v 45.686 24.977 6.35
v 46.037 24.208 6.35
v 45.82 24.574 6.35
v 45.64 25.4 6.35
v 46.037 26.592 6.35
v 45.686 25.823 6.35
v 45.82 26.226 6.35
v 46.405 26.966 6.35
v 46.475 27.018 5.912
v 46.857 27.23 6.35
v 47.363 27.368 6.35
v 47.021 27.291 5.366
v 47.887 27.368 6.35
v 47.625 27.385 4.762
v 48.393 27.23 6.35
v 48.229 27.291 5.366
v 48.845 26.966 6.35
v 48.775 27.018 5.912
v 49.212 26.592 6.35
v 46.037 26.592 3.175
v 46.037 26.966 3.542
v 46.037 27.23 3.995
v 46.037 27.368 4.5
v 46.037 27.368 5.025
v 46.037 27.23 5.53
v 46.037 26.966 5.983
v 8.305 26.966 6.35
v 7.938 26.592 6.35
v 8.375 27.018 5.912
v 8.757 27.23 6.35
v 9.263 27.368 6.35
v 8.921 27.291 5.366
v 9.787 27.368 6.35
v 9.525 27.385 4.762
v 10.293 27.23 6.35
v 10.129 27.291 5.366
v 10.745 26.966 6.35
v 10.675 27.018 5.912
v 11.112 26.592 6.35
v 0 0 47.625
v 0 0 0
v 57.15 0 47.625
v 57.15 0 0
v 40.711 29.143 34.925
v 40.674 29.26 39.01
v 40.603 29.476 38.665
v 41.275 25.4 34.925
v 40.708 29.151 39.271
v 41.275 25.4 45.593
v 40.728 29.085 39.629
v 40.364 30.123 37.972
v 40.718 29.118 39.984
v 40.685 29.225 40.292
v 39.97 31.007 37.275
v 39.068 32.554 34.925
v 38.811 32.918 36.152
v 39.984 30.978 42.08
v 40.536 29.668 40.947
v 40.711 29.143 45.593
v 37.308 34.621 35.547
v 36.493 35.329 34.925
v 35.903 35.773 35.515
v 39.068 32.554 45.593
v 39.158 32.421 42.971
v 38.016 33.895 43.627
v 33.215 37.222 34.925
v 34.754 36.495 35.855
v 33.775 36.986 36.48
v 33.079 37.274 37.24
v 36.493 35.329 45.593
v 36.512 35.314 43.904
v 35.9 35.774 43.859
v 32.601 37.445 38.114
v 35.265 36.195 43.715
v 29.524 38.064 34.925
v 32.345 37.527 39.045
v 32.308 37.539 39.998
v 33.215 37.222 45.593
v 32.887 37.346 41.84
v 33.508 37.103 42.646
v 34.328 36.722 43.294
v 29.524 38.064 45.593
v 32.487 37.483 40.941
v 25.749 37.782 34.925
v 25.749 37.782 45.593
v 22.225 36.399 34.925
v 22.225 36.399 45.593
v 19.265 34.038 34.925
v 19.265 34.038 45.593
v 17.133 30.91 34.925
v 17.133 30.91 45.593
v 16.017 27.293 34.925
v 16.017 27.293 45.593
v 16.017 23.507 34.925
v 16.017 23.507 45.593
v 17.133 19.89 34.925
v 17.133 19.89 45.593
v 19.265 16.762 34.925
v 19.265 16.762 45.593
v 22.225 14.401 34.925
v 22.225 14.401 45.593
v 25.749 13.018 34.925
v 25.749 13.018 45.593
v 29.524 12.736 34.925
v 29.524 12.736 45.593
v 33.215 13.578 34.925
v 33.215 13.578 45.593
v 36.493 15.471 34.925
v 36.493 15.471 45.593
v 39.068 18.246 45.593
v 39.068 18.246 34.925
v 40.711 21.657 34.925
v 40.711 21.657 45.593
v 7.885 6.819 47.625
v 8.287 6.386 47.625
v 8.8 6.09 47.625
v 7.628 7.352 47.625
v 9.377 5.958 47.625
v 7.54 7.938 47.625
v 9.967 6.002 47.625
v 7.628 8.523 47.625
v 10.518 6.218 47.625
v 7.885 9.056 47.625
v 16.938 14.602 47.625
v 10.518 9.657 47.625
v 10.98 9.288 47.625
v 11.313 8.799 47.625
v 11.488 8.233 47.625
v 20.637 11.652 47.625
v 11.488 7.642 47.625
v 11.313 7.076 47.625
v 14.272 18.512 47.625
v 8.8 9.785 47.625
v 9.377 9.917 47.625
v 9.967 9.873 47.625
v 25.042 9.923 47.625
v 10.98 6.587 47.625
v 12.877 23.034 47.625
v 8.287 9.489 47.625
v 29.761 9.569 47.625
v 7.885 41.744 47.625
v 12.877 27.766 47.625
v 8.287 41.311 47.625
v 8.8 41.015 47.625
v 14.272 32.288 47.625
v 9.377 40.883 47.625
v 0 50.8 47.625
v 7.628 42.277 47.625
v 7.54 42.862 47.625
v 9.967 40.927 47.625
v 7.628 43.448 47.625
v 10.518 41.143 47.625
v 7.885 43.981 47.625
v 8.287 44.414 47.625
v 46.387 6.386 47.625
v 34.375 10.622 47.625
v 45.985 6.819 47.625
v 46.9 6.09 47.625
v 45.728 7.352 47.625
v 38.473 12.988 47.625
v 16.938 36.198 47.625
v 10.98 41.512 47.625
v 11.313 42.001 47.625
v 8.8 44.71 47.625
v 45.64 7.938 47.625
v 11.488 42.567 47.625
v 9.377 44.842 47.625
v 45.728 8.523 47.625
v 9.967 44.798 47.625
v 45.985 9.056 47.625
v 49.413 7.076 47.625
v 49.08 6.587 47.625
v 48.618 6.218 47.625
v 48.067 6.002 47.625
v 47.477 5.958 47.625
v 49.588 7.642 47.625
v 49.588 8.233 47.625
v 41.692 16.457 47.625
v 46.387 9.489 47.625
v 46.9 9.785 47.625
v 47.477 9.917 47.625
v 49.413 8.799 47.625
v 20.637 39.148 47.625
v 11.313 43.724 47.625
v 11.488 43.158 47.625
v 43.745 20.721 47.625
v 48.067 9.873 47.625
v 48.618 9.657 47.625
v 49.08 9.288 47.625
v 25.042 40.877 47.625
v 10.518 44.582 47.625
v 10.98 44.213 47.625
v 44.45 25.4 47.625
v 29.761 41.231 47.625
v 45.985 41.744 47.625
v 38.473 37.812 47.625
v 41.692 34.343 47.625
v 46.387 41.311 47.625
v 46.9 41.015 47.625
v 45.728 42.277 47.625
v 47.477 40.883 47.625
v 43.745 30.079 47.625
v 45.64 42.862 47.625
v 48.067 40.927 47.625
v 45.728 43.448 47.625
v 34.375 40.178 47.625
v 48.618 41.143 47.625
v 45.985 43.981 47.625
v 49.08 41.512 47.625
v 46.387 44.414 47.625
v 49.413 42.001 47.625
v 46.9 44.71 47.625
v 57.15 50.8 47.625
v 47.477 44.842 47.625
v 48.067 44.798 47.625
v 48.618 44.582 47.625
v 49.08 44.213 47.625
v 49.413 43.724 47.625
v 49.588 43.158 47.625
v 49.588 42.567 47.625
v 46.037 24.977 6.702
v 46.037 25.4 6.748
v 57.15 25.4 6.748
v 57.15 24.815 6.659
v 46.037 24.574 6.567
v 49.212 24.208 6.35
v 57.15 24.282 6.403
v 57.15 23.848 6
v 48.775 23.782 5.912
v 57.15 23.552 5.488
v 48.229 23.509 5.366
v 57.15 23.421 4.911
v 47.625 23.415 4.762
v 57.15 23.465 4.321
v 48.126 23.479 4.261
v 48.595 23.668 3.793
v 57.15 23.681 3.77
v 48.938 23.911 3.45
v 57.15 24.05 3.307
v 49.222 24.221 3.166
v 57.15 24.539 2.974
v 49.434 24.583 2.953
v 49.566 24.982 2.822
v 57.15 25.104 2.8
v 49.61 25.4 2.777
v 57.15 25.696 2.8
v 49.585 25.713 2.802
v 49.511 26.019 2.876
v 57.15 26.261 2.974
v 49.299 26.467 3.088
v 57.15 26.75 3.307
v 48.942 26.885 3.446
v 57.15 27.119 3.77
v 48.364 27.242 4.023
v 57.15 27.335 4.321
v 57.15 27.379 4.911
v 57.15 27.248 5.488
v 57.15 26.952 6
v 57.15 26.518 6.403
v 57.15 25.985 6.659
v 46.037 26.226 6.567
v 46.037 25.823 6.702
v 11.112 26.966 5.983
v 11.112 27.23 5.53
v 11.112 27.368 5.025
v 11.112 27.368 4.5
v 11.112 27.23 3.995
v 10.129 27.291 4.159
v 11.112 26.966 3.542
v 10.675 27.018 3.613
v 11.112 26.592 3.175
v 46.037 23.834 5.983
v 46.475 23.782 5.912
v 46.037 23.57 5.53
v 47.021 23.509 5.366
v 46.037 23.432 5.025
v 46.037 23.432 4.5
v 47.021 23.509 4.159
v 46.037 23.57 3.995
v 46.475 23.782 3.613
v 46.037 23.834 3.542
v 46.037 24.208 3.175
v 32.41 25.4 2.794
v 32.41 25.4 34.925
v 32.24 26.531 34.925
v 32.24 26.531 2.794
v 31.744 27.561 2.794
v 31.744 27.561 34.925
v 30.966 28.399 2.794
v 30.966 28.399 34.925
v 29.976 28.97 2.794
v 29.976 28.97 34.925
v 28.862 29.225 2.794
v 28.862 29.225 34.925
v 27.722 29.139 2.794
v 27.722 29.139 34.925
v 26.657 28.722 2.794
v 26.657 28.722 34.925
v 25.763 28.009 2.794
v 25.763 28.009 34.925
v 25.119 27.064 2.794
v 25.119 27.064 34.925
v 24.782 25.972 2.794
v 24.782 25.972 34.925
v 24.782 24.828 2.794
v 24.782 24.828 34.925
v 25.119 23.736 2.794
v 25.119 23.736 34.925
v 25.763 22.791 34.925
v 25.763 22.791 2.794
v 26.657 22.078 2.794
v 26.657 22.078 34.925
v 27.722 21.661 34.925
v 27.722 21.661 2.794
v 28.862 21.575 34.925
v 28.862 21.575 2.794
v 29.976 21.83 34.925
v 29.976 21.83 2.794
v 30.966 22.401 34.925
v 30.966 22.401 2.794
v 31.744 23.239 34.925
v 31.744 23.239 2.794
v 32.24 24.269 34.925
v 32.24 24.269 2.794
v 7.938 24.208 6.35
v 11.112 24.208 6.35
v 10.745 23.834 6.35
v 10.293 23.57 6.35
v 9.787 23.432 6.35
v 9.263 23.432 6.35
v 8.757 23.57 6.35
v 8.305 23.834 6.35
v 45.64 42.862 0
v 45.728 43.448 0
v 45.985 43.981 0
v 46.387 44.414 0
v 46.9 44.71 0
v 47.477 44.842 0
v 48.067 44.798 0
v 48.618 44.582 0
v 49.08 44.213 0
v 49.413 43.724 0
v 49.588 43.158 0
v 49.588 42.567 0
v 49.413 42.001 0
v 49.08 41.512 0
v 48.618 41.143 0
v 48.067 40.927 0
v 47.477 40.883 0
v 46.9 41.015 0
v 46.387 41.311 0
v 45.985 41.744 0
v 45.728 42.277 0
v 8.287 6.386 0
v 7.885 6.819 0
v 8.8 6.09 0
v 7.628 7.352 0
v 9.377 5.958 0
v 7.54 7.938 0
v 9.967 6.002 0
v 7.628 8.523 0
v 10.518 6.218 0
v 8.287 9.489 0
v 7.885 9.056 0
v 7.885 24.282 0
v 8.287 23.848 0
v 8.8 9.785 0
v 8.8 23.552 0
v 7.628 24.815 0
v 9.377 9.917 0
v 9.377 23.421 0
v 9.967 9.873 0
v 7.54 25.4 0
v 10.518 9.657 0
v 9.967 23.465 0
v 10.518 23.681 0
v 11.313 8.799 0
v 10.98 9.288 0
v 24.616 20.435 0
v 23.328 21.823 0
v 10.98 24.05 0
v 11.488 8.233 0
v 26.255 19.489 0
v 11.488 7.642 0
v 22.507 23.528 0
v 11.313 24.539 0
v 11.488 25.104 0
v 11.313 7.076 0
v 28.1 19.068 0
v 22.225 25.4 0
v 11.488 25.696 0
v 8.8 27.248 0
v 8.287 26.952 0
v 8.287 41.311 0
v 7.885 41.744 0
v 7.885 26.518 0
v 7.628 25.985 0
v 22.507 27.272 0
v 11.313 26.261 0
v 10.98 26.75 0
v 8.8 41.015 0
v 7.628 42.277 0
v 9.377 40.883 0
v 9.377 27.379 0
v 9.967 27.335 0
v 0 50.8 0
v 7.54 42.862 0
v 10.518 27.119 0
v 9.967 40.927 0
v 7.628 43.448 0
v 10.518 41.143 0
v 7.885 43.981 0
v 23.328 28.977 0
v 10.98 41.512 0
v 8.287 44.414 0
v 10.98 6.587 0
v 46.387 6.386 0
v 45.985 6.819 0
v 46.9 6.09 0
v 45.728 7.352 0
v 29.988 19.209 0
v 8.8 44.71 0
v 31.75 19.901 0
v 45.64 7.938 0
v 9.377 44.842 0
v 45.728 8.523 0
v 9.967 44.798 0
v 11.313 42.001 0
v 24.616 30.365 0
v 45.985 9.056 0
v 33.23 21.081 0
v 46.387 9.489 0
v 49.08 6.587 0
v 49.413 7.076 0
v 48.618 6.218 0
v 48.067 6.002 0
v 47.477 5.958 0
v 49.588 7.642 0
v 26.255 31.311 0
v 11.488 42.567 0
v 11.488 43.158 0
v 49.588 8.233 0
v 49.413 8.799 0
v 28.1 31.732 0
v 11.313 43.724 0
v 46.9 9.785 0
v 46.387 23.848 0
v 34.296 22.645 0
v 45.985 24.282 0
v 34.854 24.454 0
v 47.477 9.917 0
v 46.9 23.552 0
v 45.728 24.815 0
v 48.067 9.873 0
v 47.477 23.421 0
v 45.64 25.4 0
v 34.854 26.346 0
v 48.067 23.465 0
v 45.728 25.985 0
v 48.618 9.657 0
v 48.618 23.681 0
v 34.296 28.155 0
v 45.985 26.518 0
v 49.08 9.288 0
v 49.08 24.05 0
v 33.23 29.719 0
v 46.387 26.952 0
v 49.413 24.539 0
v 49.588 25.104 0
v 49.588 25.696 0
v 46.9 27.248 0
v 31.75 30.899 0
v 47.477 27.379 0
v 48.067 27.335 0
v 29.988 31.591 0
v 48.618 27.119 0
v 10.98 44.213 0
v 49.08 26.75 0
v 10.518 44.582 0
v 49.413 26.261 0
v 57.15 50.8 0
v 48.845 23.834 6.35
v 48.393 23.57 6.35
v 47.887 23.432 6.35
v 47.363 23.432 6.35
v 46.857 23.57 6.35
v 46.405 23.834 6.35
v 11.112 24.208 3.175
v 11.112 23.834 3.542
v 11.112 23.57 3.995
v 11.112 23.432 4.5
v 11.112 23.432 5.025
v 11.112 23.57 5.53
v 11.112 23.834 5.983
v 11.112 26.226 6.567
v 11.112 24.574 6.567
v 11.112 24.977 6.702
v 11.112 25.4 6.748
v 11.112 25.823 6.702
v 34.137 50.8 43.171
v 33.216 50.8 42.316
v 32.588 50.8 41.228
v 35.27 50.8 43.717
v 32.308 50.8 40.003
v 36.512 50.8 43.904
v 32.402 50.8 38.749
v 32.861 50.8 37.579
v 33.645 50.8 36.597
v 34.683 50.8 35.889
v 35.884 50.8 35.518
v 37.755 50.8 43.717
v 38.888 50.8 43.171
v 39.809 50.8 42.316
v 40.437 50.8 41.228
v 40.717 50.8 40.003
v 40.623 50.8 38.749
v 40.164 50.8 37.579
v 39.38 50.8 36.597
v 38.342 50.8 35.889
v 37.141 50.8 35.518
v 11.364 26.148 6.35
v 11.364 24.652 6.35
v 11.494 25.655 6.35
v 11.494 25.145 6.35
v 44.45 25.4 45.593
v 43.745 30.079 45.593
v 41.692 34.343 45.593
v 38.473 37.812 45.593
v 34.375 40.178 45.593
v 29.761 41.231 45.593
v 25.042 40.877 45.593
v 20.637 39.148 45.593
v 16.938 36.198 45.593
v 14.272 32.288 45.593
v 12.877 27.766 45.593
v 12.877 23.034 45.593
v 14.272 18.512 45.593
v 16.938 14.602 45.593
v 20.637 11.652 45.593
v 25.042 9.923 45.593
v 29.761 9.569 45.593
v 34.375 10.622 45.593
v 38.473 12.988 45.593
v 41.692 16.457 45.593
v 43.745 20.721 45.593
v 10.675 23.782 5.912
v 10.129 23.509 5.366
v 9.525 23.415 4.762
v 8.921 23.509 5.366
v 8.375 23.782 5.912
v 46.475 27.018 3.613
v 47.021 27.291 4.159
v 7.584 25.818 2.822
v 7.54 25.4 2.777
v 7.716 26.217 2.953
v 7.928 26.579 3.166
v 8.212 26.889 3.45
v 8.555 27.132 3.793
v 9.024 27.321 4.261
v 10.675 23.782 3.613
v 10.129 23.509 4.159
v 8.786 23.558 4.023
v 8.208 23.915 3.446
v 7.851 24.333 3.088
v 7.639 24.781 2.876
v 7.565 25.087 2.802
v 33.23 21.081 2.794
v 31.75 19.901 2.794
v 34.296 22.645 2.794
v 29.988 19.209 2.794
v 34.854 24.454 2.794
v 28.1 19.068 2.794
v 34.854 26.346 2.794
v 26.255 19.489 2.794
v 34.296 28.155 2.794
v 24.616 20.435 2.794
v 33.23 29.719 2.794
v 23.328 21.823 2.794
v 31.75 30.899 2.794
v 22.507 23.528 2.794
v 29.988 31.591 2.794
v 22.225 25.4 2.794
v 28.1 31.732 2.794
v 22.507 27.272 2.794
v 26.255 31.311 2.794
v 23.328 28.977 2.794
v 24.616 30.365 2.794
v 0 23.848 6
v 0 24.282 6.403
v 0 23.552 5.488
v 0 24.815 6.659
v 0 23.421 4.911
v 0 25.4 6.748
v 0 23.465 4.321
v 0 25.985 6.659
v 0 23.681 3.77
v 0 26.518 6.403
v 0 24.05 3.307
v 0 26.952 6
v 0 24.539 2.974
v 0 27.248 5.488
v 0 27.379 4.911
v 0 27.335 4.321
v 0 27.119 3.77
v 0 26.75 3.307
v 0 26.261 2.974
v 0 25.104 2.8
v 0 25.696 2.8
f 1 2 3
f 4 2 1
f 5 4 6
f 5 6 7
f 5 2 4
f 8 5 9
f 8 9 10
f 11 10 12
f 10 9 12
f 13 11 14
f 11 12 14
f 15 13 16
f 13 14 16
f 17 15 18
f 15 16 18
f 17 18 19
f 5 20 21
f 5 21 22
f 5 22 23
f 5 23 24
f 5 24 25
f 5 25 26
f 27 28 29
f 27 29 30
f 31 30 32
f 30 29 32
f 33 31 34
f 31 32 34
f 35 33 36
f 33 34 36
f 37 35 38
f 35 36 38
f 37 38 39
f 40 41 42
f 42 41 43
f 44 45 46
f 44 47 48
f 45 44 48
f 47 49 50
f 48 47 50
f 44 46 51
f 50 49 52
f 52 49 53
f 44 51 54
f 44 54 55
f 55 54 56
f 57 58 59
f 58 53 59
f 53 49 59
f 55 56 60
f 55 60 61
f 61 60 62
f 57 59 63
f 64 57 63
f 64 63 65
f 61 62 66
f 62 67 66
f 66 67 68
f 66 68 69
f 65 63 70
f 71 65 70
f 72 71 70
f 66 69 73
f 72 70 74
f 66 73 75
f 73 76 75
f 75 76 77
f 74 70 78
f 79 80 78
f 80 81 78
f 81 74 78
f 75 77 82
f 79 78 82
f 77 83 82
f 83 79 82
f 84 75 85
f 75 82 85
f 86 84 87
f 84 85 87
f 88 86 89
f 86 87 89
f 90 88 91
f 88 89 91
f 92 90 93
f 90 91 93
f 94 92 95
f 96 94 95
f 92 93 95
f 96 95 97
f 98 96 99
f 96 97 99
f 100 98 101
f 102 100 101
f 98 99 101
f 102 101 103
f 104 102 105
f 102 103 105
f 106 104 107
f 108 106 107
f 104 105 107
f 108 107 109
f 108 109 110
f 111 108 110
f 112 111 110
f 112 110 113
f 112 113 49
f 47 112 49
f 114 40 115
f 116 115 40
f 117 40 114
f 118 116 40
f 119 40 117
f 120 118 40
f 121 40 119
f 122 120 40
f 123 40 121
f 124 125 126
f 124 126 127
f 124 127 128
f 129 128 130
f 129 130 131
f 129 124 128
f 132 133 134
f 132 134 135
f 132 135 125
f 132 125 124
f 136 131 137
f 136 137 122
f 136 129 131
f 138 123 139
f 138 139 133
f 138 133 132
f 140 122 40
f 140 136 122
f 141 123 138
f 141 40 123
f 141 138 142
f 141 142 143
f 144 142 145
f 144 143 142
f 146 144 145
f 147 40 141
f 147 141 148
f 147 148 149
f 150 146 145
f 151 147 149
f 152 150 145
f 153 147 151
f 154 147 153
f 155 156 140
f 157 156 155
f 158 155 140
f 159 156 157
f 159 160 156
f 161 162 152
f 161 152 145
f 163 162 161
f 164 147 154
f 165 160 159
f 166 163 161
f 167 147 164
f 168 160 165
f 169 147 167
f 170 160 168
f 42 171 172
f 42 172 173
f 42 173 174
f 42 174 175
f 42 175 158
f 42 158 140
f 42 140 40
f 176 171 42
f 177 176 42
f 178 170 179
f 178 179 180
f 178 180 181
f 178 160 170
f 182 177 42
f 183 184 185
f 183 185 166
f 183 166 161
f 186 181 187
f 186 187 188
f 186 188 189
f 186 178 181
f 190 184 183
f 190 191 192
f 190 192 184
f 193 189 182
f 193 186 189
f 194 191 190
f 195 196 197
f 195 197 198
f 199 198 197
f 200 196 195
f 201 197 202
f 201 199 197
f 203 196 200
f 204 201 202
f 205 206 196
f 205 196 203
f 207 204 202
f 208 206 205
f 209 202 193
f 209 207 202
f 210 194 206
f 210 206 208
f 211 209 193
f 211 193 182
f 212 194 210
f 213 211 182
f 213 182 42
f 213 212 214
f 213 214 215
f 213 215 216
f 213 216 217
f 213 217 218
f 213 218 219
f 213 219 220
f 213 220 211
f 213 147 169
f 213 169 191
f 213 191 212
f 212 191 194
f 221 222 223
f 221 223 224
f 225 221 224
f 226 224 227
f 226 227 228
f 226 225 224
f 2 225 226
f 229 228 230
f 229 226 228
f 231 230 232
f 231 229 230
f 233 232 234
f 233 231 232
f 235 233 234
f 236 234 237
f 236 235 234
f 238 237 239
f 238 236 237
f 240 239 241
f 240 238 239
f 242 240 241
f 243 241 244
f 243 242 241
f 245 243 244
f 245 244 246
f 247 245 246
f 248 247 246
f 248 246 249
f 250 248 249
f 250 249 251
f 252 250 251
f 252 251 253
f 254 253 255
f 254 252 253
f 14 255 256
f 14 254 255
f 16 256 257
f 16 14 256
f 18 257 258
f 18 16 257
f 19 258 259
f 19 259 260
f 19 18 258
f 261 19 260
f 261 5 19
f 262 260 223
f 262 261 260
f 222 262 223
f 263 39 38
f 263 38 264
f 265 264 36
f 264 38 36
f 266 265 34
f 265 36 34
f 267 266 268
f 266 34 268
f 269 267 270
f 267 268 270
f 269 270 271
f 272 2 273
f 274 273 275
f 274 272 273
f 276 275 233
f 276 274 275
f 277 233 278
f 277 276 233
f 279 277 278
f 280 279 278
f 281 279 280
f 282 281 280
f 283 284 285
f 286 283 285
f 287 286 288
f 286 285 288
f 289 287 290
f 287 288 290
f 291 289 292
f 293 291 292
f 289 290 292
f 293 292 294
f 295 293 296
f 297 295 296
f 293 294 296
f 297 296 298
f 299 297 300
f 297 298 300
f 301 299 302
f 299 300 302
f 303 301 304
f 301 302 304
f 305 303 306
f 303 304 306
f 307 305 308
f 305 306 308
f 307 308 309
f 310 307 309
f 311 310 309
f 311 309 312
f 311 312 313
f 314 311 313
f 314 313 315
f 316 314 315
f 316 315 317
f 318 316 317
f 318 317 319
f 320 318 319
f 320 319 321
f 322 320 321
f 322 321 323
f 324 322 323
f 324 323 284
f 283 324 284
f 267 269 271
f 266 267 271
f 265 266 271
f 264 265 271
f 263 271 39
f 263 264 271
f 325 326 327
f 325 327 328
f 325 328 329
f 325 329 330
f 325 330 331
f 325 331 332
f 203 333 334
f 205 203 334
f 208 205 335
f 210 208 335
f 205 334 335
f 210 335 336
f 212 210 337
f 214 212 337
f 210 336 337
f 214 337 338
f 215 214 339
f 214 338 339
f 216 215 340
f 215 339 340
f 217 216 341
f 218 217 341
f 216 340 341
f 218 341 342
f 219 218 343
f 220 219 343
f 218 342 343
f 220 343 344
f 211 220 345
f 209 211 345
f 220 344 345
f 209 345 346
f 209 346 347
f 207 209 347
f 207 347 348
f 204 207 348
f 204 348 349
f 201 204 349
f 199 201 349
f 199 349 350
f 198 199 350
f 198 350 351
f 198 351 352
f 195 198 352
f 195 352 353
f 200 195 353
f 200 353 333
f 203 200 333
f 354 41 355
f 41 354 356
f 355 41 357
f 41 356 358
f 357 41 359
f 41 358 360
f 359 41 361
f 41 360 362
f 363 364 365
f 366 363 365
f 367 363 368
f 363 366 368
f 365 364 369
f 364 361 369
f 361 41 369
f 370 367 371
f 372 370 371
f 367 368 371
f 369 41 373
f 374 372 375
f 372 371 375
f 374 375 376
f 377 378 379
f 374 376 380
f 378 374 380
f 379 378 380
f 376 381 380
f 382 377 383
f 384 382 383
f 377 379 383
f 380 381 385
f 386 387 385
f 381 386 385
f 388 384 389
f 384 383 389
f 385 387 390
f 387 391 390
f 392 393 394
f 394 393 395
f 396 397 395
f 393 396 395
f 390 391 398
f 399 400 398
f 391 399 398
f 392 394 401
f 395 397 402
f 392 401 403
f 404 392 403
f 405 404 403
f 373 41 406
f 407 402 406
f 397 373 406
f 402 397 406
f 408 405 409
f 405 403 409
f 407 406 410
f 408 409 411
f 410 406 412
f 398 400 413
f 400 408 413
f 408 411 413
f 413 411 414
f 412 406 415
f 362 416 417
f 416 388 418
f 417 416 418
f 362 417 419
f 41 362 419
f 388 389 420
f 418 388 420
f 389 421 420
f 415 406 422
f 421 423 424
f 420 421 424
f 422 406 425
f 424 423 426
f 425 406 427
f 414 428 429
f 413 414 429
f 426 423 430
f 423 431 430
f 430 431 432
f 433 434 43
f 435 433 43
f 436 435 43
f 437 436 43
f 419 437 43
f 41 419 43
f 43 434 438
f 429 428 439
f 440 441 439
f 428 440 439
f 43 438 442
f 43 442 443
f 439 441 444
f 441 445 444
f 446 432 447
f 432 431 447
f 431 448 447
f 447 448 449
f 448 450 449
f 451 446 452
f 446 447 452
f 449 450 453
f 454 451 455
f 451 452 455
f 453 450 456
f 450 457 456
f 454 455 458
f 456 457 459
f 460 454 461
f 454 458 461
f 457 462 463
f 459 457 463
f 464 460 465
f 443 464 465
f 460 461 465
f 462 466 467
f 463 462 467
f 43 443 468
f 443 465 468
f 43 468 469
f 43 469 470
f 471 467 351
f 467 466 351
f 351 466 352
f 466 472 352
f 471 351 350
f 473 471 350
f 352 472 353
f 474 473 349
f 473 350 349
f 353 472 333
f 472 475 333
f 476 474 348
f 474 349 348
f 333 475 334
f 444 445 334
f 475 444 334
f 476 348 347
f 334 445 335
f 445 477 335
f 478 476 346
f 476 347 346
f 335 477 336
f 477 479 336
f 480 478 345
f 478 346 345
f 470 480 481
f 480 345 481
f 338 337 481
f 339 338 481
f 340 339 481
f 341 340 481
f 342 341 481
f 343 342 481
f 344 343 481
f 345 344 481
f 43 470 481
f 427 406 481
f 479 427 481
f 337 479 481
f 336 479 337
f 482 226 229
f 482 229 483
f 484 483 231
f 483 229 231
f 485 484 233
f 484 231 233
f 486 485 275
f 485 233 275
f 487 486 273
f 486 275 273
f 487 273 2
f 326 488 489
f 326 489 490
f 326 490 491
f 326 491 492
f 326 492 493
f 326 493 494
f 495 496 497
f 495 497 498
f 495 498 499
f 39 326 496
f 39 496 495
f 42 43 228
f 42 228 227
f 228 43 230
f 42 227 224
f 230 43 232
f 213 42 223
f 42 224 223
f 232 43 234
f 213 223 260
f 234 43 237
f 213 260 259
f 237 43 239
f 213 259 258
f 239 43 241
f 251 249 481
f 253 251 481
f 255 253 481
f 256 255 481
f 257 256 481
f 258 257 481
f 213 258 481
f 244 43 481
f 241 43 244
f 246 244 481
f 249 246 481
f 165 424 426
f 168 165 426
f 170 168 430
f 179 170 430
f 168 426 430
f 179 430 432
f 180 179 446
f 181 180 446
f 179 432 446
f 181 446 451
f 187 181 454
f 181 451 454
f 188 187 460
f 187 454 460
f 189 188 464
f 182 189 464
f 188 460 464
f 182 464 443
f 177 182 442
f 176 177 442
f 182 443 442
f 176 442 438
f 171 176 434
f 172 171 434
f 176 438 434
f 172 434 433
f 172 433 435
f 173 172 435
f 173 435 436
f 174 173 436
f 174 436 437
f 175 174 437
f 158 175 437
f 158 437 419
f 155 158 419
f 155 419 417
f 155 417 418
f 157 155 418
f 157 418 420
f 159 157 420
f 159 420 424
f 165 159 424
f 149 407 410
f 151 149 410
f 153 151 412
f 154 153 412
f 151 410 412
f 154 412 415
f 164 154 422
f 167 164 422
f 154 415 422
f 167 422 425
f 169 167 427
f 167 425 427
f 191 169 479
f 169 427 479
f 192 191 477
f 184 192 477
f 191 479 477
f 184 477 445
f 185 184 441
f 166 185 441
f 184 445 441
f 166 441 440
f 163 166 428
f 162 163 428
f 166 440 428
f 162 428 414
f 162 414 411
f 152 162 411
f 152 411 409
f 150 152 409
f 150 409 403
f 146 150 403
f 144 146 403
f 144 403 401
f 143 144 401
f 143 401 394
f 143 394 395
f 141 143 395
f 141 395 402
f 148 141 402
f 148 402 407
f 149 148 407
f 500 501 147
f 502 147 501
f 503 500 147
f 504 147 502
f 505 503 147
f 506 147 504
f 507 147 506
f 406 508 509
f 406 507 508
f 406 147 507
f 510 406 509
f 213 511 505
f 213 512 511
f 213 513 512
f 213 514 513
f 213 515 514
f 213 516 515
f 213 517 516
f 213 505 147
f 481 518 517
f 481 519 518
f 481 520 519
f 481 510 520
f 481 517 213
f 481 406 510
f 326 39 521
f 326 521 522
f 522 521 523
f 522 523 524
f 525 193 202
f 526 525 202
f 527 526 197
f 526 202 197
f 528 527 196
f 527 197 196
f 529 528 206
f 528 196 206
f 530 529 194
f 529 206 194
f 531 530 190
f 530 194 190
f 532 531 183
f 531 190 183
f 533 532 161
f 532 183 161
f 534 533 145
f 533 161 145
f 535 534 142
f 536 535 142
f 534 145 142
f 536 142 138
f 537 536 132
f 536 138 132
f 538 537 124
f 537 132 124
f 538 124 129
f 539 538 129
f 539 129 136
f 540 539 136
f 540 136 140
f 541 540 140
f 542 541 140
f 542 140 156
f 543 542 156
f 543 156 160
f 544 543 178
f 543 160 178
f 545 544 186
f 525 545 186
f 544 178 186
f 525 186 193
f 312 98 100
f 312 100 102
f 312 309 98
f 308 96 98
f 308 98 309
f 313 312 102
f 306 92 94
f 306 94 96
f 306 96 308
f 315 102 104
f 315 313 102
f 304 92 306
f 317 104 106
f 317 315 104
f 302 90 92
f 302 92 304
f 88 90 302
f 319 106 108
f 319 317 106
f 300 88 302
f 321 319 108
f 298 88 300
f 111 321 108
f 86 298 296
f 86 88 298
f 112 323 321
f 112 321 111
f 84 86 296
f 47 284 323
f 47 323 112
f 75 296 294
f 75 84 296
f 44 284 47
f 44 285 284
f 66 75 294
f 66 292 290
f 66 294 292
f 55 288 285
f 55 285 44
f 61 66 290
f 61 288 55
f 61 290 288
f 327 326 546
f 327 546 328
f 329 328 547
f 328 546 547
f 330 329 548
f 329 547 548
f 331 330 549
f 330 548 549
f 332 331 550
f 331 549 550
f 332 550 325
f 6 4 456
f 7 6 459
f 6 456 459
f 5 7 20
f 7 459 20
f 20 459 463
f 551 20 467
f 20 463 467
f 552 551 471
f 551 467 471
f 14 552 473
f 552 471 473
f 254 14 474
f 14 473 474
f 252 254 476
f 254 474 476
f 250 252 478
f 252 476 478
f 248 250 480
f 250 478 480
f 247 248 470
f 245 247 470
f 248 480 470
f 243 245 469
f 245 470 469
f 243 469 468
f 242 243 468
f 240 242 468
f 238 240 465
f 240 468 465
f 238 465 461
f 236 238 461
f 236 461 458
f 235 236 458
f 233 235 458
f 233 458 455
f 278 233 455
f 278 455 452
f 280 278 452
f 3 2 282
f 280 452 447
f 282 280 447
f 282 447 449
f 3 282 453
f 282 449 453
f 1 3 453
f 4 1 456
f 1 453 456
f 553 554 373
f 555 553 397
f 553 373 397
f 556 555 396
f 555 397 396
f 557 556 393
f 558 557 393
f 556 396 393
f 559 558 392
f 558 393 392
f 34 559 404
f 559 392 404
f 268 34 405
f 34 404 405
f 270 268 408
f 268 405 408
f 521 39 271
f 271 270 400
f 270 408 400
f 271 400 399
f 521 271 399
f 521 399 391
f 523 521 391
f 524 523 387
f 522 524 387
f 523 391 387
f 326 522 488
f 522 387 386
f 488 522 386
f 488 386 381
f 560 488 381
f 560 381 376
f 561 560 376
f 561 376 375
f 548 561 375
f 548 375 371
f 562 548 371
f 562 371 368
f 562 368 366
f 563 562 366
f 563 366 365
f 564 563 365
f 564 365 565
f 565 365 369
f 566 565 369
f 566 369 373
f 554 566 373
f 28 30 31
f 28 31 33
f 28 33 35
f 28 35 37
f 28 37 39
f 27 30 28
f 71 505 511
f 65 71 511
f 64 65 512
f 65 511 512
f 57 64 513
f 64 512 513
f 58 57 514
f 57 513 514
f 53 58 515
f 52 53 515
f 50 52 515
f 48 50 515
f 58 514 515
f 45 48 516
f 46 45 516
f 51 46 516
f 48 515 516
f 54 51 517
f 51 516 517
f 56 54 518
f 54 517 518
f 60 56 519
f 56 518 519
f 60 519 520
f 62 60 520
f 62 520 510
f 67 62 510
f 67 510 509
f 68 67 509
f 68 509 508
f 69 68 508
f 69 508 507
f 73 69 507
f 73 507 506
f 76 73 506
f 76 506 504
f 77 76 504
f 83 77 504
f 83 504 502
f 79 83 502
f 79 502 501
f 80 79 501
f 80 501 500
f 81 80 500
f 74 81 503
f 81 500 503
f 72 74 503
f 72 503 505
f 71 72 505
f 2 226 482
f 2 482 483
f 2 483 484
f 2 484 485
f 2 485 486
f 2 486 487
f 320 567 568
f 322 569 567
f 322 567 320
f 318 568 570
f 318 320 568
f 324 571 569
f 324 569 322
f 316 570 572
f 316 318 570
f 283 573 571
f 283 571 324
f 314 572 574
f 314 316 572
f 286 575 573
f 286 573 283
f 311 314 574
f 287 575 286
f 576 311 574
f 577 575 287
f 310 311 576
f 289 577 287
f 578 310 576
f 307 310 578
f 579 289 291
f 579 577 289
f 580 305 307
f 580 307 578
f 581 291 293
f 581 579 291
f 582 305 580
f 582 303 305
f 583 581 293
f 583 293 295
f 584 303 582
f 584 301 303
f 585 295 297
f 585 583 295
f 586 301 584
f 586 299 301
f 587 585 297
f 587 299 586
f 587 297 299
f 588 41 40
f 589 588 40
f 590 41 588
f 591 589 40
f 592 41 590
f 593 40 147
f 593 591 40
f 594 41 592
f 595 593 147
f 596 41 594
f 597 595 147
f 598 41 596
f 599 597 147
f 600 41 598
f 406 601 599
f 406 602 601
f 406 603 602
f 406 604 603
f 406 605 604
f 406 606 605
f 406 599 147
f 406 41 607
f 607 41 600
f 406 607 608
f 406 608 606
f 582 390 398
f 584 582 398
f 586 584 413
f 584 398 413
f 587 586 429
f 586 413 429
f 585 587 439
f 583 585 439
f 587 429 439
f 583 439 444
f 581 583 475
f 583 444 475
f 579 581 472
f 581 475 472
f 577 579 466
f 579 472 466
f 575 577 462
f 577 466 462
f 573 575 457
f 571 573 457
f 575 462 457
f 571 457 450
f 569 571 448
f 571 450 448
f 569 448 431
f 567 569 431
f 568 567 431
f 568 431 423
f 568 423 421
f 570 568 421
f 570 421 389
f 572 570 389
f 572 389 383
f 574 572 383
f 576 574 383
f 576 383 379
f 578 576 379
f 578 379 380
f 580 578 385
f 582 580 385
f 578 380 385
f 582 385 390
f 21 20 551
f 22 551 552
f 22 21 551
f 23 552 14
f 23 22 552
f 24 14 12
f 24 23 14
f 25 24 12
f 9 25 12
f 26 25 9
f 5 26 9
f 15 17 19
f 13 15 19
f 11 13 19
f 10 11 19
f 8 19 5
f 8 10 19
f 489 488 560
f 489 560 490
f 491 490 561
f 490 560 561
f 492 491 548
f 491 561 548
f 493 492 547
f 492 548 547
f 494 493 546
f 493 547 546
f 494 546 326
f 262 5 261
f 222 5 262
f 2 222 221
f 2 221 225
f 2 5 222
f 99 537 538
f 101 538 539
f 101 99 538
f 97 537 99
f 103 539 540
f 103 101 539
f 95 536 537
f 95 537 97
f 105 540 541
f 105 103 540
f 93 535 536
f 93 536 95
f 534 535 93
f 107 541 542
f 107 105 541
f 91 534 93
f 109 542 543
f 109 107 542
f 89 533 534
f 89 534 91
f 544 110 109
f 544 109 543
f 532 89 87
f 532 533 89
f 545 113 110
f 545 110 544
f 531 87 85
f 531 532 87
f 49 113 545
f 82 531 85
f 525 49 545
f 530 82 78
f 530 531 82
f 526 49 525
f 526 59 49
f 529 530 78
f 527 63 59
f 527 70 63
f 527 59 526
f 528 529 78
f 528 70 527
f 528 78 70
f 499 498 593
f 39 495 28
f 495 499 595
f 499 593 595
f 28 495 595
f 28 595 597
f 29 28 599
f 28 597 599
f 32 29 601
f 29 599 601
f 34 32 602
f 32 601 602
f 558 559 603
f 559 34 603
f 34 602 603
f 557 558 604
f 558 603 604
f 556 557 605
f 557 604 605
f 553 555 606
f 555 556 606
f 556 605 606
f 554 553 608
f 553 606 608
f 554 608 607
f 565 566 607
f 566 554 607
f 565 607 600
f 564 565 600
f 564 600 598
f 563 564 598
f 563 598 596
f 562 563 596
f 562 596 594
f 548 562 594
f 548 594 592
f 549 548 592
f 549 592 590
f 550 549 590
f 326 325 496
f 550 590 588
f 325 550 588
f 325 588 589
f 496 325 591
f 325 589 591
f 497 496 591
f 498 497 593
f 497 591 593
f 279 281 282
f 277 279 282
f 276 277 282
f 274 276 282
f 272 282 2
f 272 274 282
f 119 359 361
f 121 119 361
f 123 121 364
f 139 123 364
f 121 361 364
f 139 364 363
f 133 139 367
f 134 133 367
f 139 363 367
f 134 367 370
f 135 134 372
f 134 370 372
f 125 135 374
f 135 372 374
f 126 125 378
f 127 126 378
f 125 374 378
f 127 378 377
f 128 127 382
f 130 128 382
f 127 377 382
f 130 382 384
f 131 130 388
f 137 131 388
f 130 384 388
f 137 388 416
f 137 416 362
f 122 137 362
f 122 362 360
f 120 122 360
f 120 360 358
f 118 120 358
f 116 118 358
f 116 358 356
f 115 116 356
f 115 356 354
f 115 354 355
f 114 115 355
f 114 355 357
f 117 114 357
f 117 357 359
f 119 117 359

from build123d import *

# Parameters (mm, degrees)
SKETCH1_W           = 57.15
SKETCH1_H           = 50.8
BOSS_EXTRUDE1_DEPTH = 47.625
SKETCH2_R           = 3.8354
CUT_EXTRUDE1_DEPTH  = 91.08275709
SKETCH3_R           = 12.7
CUT_EXTRUDE2_DEPTH  = 12.7
SKETCH4_R           = 15.875
CUT_EXTRUDE3_DEPTH  = 2.032
SKETCH5_R           = 4.2164
CUT_EXTRUDE4_DEPTH  = 25.4
SKETCH6_R           = 6.35
CUT_EXTRUDE5_DEPTH  = 2.794
SKETCH7_R           = 1.98501
CUT_EXTRUDE6_DEPTH  = 6.35
SKETCH8_R           = 1.98501
CUT_EXTRUDE7_DEPTH  = 91.082757147
SKETCH9_R           = 1.98501
CUT_EXTRUDE9_DEPTH  = 11.1125
CUT_EXTRUDE10_START = -11.1125
SKETCH10_R          = 1.98501
CUT_EXTRUDE10_DEPTH = 11.1125


with BuildPart() as part:
    # Sketch1 → Boss-Extrude1 (new body)
    with BuildSketch(Plane.XY):
        with Locations((28.575, 25.4)):
            Rectangle(SKETCH1_W, SKETCH1_H)
    extrude(amount=BOSS_EXTRUDE1_DEPTH)

    # Sketch2 → Cut-Extrude1 (cut, through all)
    with BuildSketch(Plane.XY.offset(47.625)):
        with Locations((28.575, 25.4)):
            Circle(SKETCH2_R)
    extrude(amount=-CUT_EXTRUDE1_DEPTH, mode=Mode.SUBTRACT)

    # Sketch3 → Cut-Extrude2 (cut)
    with BuildSketch(Plane.XY.offset(47.625)):
        with Locations((28.575, 25.4)):
            Circle(SKETCH3_R)
    extrude(amount=-CUT_EXTRUDE2_DEPTH, mode=Mode.SUBTRACT)

    # Sketch4 → Cut-Extrude3 (cut)
    with BuildSketch(Plane.XY.offset(47.625)):
        with Locations((28.575, 25.4)):
            Circle(SKETCH4_R)
    extrude(amount=-CUT_EXTRUDE3_DEPTH, mode=Mode.SUBTRACT)

    # Sketch5 → Cut-Extrude4 (cut)
    with BuildSketch(Plane(origin=(0, 50.8, 0), x_dir=(1, 0, 0), z_dir=(0, 1, 0))):
        with Locations(Location((36.5125, -39.6875, 0), (0, 0, 270))):
            Circle(SKETCH5_R)
    extrude(amount=-CUT_EXTRUDE4_DEPTH, mode=Mode.SUBTRACT)

    # Sketch6 → Cut-Extrude5 (cut)
    with BuildSketch(Plane(origin=(0, 0, 0), x_dir=(-1, 0, 0), z_dir=(0, 0, -1))):
        with Locations((-28.575, 25.4)):
            Circle(SKETCH6_R)
    extrude(amount=-CUT_EXTRUDE5_DEPTH, mode=Mode.SUBTRACT)

    # Sketch7 → Cut-Extrude6 (cut)
    with BuildSketch(Plane(origin=(0, 0, 0), x_dir=(-1, 0, 0), z_dir=(0, 0, -1))):
        with Locations((-9.525, 25.4)):
            Circle(SKETCH7_R)
        with Locations((-47.625, 25.4)):
            Circle(SKETCH7_R)
    extrude(amount=-CUT_EXTRUDE6_DEPTH, mode=Mode.SUBTRACT)

    # Sketch8 → Cut-Extrude7 (cut, through all)
    with BuildSketch(Plane(origin=(0, 0, 0), x_dir=(-1, 0, 0), z_dir=(0, 0, -1))):
        with Locations((-47.625, 42.8625)):
            Circle(SKETCH8_R)
        with Locations((-9.525, 42.8625)):
            Circle(SKETCH8_R)
        with Locations((-9.525, 7.9375)):
            Circle(SKETCH8_R)
        with Locations((-47.625, 7.9375)):
            Circle(SKETCH8_R)
    extrude(amount=-CUT_EXTRUDE7_DEPTH, mode=Mode.SUBTRACT)

    # Sketch9 → Cut-Extrude9 (cut)
    with BuildSketch(Plane.ZY):
        with Locations((4.7625, 25.4)):
            Circle(SKETCH9_R)
    extrude(amount=-CUT_EXTRUDE9_DEPTH, mode=Mode.SUBTRACT)

    # Sketch10 → Cut-Extrude10 (cut)
    with BuildSketch(Plane(origin=(57.15, 0, 0), x_dir=(0, 0, -1), z_dir=(1, 0, 0)).offset(CUT_EXTRUDE10_START)):
        with Locations(Location((-4.7625, 25.4, 0), (0, 0, 180))):
            Circle(SKETCH10_R)
    extrude(amount=CUT_EXTRUDE10_DEPTH, mode=Mode.SUBTRACT)


solid = part.part
